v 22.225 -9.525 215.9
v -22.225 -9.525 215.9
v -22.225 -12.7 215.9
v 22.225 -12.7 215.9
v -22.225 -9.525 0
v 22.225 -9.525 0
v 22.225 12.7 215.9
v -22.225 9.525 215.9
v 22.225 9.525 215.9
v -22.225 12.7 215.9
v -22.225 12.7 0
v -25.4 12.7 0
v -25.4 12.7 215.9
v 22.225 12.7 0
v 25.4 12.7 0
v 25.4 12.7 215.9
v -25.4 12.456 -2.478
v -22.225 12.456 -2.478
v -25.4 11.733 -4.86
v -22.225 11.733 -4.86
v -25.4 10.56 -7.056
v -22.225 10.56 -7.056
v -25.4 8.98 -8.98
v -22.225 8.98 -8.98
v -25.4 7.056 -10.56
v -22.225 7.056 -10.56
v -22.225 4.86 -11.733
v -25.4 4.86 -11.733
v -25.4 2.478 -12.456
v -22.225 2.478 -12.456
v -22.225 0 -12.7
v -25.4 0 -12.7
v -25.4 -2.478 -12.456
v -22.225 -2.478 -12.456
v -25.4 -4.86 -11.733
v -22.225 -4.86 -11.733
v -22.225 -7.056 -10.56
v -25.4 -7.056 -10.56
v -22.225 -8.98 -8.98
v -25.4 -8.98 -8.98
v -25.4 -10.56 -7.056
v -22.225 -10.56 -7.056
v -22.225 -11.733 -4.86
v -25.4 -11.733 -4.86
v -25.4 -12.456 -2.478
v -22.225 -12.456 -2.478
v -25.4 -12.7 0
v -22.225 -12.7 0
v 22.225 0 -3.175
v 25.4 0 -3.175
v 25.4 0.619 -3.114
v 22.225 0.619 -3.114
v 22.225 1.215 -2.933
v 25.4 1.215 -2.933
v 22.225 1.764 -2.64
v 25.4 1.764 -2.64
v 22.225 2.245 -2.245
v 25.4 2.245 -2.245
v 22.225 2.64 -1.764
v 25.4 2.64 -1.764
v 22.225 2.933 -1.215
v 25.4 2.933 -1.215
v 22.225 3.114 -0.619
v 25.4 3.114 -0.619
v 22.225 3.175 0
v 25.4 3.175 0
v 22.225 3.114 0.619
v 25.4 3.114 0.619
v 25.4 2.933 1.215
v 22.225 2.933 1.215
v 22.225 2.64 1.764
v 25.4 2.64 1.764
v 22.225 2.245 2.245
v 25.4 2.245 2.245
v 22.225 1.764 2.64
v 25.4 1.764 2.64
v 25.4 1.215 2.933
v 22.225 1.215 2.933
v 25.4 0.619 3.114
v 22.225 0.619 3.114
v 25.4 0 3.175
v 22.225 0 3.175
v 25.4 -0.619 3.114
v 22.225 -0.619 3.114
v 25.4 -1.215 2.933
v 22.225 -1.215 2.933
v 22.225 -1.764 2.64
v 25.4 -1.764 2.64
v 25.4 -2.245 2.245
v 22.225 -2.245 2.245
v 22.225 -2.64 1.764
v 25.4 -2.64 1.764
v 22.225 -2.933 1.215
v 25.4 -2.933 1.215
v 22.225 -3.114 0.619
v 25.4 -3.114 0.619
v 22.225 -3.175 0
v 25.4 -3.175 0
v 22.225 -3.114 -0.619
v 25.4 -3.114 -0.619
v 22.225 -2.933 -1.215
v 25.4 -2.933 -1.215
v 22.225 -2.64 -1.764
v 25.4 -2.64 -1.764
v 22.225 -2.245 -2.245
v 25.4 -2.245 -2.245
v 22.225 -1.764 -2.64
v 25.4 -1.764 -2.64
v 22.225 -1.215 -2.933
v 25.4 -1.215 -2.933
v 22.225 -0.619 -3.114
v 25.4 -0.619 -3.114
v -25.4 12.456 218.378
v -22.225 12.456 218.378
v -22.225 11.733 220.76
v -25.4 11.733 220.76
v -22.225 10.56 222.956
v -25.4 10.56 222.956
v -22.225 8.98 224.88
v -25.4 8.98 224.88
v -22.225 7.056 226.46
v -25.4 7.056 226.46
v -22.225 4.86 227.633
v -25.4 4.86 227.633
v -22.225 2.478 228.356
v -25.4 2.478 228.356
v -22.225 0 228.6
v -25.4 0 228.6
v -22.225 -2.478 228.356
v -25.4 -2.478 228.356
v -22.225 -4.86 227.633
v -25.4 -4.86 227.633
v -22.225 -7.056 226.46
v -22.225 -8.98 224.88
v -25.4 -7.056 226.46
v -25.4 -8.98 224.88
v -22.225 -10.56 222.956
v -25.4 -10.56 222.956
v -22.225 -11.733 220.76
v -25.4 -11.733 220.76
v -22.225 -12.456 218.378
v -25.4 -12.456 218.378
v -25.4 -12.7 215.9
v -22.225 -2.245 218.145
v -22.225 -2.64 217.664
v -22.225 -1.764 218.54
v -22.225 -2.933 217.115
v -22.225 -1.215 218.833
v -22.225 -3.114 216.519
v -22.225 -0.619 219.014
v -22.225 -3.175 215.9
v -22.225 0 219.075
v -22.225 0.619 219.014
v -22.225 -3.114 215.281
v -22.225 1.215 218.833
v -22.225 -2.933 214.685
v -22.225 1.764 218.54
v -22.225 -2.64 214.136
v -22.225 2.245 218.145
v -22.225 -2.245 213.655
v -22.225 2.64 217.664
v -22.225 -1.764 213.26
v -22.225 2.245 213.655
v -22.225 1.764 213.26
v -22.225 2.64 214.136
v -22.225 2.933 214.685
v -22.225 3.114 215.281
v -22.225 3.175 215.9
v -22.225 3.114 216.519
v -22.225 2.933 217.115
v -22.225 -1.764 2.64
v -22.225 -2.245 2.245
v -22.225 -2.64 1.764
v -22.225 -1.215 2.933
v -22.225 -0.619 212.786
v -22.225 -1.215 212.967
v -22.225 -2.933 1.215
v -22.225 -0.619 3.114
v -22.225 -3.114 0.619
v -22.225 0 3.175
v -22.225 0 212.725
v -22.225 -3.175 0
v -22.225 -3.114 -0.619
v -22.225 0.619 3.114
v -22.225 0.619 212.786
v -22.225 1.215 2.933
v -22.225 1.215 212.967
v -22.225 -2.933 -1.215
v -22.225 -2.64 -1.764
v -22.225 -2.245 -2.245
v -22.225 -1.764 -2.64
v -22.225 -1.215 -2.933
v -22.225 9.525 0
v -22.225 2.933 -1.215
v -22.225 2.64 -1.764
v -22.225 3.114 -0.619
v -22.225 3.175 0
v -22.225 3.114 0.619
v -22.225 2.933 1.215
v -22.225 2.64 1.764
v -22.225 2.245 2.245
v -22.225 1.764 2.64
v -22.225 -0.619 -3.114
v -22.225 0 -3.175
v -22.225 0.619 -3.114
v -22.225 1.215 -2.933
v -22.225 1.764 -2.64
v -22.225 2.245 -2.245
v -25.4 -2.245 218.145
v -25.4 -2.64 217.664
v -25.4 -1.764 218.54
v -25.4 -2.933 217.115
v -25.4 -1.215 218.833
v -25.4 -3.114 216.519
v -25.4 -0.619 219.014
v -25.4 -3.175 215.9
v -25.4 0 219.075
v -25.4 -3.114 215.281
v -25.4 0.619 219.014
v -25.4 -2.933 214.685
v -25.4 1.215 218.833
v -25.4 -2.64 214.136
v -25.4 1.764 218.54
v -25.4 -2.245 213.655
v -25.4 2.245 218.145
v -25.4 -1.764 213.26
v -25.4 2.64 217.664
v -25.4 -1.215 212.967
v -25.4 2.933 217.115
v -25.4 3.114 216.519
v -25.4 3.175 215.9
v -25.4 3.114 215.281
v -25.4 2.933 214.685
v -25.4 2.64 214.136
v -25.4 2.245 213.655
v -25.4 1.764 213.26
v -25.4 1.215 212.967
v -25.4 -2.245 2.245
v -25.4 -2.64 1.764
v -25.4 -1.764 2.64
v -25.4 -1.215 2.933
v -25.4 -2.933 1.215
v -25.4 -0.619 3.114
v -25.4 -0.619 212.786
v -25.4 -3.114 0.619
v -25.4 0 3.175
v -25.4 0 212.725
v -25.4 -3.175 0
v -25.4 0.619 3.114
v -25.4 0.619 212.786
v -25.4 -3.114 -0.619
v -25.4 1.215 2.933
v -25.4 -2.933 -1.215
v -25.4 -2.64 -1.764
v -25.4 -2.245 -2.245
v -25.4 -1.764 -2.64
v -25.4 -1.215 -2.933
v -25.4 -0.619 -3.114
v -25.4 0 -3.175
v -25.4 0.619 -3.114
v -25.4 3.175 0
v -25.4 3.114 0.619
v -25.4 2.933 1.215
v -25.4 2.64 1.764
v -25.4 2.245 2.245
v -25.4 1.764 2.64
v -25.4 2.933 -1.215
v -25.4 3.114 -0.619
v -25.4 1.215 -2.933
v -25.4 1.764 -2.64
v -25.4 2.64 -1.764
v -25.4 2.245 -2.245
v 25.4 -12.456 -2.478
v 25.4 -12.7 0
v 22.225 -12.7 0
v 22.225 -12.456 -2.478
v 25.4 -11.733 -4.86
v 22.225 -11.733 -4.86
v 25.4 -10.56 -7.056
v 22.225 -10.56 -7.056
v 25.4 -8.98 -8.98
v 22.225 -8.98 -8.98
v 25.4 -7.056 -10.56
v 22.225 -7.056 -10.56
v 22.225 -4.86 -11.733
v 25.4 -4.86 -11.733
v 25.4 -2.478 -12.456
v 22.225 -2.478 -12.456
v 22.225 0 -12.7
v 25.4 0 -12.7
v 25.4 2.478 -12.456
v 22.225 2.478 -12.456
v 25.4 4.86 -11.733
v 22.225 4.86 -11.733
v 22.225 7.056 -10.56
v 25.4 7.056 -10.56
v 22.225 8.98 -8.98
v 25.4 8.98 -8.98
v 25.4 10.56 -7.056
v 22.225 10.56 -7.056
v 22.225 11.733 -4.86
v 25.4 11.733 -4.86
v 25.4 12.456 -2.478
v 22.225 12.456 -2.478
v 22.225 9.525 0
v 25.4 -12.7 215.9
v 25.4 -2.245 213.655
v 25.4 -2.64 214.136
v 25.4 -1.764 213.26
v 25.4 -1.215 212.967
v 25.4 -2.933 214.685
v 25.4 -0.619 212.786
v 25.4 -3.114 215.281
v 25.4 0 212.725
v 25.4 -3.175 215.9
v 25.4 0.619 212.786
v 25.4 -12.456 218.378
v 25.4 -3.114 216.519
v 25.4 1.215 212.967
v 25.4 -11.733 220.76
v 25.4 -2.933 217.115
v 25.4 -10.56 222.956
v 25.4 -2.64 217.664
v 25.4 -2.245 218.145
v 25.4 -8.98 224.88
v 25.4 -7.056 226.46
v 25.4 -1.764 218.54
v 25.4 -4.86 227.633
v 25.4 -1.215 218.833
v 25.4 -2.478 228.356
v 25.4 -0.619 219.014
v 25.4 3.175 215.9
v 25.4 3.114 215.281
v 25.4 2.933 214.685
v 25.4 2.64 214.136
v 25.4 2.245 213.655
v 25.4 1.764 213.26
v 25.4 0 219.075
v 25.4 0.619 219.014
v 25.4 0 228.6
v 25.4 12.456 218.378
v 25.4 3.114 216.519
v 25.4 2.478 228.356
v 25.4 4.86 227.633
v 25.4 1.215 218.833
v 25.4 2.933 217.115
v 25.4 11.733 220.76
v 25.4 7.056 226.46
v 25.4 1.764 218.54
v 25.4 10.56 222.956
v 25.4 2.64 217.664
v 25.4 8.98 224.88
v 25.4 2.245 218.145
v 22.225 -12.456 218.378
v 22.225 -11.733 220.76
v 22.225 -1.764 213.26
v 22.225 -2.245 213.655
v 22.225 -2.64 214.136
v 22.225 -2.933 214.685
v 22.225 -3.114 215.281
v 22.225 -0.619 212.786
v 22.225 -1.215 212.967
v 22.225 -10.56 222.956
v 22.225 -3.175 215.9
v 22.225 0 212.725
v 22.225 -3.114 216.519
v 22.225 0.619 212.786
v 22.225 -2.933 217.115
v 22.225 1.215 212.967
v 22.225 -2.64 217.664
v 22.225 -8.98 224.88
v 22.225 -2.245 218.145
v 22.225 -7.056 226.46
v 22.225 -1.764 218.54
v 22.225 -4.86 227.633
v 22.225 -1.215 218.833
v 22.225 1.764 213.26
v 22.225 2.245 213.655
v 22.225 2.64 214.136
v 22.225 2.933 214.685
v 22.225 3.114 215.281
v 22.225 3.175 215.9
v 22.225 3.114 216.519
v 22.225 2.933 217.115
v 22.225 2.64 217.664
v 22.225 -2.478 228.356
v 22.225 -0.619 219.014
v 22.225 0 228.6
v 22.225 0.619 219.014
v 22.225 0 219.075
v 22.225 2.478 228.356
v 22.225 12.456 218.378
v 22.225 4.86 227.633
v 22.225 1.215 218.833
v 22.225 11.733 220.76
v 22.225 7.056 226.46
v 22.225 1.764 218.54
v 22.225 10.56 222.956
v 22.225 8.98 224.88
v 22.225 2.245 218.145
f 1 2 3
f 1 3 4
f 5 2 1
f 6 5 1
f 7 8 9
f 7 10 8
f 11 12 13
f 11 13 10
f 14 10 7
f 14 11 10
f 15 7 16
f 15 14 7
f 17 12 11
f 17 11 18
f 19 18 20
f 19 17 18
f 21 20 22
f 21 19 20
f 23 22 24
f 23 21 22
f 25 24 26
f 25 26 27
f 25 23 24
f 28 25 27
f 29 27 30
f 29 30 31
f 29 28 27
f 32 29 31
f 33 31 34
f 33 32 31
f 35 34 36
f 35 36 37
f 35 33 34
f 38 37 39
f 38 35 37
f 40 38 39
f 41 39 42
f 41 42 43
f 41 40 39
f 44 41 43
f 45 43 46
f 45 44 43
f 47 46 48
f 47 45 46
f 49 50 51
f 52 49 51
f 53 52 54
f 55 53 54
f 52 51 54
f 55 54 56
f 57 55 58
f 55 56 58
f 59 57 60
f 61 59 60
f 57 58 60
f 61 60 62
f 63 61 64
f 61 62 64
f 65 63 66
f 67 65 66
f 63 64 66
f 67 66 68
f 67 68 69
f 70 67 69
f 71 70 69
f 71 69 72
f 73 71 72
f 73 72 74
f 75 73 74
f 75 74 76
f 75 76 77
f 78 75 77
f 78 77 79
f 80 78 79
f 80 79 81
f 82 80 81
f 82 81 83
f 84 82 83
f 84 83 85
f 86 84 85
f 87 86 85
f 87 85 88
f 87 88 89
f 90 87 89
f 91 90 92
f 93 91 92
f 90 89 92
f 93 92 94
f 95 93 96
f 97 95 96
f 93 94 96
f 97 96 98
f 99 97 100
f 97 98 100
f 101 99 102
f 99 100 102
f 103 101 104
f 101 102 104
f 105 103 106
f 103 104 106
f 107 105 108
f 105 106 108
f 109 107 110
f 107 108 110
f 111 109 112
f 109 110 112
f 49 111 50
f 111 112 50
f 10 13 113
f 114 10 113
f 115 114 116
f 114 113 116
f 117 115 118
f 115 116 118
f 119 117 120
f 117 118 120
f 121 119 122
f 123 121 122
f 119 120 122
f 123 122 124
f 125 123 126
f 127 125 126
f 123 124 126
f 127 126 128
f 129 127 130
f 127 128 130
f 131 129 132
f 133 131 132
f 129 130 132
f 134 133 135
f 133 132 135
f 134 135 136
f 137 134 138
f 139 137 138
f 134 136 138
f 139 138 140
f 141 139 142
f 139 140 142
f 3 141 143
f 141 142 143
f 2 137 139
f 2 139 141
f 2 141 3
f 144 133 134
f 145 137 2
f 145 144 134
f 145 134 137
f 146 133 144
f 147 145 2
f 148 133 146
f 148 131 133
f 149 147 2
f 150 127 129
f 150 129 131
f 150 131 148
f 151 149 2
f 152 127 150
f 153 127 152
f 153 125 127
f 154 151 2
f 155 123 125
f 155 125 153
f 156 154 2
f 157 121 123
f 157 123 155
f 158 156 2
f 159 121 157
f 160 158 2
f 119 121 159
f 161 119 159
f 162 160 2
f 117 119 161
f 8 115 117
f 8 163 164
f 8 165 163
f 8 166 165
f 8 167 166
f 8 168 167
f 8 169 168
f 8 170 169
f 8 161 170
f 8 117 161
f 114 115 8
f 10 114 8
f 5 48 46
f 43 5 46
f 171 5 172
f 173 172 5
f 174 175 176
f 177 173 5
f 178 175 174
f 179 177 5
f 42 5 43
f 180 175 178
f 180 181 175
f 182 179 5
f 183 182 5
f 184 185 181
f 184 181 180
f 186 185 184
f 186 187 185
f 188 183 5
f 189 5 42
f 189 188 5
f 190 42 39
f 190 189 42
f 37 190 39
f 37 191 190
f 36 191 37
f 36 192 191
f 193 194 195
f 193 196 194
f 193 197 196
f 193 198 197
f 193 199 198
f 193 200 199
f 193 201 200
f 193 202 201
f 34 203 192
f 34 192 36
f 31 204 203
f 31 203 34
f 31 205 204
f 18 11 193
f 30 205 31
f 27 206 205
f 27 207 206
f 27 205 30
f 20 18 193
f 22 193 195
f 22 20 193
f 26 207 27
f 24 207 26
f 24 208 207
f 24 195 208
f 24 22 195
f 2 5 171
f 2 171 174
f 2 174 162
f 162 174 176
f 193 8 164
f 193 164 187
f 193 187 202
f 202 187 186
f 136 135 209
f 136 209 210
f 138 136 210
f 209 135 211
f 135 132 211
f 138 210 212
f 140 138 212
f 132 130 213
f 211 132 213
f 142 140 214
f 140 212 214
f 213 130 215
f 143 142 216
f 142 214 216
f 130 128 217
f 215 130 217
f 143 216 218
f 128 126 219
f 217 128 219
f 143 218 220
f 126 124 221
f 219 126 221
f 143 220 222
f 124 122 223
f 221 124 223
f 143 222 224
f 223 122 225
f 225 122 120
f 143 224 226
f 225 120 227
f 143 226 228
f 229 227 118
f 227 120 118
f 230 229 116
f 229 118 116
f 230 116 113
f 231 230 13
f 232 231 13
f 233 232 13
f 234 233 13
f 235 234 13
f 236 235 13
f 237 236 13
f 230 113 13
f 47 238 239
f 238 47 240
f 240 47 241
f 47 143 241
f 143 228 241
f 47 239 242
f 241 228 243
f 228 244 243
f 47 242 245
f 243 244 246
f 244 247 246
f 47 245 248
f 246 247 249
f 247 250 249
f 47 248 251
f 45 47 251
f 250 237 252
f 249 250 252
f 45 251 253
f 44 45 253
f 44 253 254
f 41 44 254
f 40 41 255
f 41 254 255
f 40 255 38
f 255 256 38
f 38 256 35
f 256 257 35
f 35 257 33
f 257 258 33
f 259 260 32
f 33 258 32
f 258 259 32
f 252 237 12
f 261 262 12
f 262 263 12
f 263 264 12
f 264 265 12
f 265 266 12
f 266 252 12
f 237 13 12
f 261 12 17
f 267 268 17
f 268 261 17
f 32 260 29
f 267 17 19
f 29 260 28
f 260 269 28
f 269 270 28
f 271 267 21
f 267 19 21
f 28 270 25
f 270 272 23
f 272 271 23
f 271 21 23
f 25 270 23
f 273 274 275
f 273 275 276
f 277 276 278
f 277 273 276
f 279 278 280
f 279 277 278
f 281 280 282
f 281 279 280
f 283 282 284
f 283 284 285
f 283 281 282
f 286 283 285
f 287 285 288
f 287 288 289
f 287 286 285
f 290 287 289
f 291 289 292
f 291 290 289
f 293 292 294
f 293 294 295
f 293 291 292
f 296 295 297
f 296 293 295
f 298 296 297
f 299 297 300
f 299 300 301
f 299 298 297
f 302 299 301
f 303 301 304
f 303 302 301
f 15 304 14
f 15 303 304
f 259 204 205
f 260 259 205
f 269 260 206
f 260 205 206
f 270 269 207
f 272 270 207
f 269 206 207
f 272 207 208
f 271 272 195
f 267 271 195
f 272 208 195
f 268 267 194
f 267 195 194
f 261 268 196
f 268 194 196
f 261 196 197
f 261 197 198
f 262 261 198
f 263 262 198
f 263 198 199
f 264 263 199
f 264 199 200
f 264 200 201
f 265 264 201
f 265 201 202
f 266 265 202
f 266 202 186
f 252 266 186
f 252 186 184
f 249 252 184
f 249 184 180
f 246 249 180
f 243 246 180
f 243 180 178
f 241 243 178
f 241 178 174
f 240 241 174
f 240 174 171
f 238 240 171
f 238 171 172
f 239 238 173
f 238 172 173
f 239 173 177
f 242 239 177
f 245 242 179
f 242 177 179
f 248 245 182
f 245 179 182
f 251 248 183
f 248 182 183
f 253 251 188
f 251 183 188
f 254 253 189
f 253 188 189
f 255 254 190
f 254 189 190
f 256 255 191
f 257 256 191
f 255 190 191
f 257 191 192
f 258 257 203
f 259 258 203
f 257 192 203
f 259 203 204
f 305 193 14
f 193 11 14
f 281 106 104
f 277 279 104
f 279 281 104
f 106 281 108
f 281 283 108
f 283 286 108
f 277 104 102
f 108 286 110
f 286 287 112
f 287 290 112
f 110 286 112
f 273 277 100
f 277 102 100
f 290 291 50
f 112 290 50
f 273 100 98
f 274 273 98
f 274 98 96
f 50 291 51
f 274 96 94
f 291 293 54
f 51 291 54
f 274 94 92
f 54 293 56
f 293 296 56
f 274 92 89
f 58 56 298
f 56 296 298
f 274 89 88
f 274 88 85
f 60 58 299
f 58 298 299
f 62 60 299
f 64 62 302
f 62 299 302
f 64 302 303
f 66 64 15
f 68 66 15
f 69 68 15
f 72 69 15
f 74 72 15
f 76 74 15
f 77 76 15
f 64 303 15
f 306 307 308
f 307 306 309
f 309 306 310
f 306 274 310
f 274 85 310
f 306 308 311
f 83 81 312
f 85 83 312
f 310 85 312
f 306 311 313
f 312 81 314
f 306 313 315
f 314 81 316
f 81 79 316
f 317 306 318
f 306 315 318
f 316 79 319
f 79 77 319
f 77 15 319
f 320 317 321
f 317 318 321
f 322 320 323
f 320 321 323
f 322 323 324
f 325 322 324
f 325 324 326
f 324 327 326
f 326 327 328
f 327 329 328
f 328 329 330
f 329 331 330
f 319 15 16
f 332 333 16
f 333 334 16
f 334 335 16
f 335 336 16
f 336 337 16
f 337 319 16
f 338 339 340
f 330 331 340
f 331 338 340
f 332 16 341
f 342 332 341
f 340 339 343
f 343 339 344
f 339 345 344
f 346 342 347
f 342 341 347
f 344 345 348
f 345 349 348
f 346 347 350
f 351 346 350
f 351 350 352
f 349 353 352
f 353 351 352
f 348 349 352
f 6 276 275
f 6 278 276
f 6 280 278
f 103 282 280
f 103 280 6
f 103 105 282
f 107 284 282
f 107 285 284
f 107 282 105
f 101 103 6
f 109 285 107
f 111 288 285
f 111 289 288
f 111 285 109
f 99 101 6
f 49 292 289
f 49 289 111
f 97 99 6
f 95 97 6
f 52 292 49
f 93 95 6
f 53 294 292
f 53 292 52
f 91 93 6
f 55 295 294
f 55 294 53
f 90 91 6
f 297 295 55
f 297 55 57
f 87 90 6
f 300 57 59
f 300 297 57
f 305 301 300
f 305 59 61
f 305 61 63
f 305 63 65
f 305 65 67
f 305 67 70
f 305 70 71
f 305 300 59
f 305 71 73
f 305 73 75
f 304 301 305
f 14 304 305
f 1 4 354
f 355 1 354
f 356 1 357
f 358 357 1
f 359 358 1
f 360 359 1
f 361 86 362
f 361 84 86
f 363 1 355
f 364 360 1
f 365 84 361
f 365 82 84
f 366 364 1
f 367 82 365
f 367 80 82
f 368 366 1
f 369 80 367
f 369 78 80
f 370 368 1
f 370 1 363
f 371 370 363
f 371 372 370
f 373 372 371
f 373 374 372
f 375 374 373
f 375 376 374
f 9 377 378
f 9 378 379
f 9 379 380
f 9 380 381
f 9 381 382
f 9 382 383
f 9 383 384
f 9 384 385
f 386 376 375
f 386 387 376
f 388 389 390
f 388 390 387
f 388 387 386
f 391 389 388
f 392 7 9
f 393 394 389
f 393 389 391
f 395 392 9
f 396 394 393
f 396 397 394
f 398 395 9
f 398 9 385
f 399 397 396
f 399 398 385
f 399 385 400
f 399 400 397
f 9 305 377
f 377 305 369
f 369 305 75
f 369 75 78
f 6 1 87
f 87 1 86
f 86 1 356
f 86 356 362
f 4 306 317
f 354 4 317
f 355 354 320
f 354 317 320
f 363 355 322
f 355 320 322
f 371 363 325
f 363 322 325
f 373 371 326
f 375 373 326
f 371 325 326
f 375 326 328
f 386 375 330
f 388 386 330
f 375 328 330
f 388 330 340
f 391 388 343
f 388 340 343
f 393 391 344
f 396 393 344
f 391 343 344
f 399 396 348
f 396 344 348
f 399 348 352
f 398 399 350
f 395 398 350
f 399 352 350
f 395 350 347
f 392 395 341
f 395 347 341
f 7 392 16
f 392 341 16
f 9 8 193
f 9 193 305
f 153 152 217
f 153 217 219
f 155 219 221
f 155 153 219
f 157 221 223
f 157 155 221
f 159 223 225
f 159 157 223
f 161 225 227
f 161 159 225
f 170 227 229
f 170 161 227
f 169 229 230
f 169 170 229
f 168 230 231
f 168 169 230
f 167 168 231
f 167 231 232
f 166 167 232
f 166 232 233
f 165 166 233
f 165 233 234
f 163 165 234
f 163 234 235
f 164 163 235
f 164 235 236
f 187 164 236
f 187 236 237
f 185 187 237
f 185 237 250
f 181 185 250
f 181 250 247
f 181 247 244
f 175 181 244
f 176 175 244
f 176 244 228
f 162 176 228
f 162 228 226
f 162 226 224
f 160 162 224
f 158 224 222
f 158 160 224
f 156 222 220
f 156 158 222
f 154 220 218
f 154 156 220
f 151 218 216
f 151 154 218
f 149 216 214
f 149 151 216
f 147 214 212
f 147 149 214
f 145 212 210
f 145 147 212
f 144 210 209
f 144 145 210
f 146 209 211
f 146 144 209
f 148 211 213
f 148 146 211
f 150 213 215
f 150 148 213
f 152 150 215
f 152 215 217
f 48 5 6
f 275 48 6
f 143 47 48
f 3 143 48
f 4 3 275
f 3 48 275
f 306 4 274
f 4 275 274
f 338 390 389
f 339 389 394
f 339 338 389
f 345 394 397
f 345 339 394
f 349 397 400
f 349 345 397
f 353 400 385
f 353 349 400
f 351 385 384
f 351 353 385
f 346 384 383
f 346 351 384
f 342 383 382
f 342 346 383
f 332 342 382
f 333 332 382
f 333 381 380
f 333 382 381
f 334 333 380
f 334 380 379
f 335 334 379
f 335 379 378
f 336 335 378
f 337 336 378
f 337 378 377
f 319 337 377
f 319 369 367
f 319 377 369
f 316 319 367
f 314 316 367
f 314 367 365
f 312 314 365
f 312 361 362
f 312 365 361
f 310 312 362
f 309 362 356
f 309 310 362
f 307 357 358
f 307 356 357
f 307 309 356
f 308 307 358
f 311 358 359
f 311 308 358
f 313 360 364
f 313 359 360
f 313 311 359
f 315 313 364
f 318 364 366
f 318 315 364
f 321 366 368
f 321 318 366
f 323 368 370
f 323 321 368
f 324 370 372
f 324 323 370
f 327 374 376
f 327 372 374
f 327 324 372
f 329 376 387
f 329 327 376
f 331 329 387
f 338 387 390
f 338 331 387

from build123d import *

# Parameters (mm, degrees)
LINK2OUTERLIP_W     = 50.8
LINK2OUTERLIP_H     = 25.4
LINK2OUTERLIP_W_2   = 44.45
LINK2OUTERLIP_H_2   = 19.05
EXTRUDE_THIN1_DEPTH = 215.9
BOSS_EXTRUDE1_DEPTH = 3.175
BOSS_EXTRUDE2_DEPTH = 3.175
SKETCH4_R           = 3.175
CUT_EXTRUDE1_DEPTH  = 50.8


with BuildPart() as part:
    # Link2OuterLip → Extrude-Thin1 (new body)
    with BuildSketch(Plane.XY):
        Rectangle(LINK2OUTERLIP_W, LINK2OUTERLIP_H)
        Rectangle(LINK2OUTERLIP_W_2, LINK2OUTERLIP_H_2, mode=Mode.SUBTRACT)
    extrude(amount=EXTRUDE_THIN1_DEPTH)

    # Sketch2 → Boss-Extrude1 (add)
    with BuildSketch(Plane.ZY.offset(25.4)):
        with BuildLine():
            Line((0, -12.7), (0, 12.7))
            ThreePointArc((0, 12.7), (-12.7, 0), (0, -12.7))
        make_face()
    boss_extrude1 = extrude(amount=-BOSS_EXTRUDE1_DEPTH)

    # Sketch3 → Boss-Extrude2 (add)
    with BuildSketch(Plane(origin=(25.4, 0, 0), x_dir=(0, 0, -1), z_dir=(1, 0, 0))):
        with BuildLine():
            Line((0, 12.7), (0, -12.7))
            ThreePointArc((0, -12.7), (12.7, 0), (0, 12.7))
        make_face()
    boss_extrude2 = extrude(amount=-BOSS_EXTRUDE2_DEPTH)

    # Sketch4 → Cut-Extrude1 (cut)
    with BuildSketch(Plane(origin=(25.4, 0, 0), x_dir=(0, 0, -1), z_dir=(1, 0, 0))):
        Circle(SKETCH4_R)
    cut_extrude1 = extrude(amount=-CUT_EXTRUDE1_DEPTH, mode=Mode.SUBTRACT)

    # Mirror1: Boss-Extrude1, Boss-Extrude2, Cut-Extrude1 across plane
    add(boss_extrude1.mirror(Plane.XY.offset(107.95)))
    add(boss_extrude2.mirror(Plane.XY.offset(107.95)))
    add(cut_extrude1.mirror(Plane.XY.offset(107.95)), mode=Mode.SUBTRACT)


solid = part.part
